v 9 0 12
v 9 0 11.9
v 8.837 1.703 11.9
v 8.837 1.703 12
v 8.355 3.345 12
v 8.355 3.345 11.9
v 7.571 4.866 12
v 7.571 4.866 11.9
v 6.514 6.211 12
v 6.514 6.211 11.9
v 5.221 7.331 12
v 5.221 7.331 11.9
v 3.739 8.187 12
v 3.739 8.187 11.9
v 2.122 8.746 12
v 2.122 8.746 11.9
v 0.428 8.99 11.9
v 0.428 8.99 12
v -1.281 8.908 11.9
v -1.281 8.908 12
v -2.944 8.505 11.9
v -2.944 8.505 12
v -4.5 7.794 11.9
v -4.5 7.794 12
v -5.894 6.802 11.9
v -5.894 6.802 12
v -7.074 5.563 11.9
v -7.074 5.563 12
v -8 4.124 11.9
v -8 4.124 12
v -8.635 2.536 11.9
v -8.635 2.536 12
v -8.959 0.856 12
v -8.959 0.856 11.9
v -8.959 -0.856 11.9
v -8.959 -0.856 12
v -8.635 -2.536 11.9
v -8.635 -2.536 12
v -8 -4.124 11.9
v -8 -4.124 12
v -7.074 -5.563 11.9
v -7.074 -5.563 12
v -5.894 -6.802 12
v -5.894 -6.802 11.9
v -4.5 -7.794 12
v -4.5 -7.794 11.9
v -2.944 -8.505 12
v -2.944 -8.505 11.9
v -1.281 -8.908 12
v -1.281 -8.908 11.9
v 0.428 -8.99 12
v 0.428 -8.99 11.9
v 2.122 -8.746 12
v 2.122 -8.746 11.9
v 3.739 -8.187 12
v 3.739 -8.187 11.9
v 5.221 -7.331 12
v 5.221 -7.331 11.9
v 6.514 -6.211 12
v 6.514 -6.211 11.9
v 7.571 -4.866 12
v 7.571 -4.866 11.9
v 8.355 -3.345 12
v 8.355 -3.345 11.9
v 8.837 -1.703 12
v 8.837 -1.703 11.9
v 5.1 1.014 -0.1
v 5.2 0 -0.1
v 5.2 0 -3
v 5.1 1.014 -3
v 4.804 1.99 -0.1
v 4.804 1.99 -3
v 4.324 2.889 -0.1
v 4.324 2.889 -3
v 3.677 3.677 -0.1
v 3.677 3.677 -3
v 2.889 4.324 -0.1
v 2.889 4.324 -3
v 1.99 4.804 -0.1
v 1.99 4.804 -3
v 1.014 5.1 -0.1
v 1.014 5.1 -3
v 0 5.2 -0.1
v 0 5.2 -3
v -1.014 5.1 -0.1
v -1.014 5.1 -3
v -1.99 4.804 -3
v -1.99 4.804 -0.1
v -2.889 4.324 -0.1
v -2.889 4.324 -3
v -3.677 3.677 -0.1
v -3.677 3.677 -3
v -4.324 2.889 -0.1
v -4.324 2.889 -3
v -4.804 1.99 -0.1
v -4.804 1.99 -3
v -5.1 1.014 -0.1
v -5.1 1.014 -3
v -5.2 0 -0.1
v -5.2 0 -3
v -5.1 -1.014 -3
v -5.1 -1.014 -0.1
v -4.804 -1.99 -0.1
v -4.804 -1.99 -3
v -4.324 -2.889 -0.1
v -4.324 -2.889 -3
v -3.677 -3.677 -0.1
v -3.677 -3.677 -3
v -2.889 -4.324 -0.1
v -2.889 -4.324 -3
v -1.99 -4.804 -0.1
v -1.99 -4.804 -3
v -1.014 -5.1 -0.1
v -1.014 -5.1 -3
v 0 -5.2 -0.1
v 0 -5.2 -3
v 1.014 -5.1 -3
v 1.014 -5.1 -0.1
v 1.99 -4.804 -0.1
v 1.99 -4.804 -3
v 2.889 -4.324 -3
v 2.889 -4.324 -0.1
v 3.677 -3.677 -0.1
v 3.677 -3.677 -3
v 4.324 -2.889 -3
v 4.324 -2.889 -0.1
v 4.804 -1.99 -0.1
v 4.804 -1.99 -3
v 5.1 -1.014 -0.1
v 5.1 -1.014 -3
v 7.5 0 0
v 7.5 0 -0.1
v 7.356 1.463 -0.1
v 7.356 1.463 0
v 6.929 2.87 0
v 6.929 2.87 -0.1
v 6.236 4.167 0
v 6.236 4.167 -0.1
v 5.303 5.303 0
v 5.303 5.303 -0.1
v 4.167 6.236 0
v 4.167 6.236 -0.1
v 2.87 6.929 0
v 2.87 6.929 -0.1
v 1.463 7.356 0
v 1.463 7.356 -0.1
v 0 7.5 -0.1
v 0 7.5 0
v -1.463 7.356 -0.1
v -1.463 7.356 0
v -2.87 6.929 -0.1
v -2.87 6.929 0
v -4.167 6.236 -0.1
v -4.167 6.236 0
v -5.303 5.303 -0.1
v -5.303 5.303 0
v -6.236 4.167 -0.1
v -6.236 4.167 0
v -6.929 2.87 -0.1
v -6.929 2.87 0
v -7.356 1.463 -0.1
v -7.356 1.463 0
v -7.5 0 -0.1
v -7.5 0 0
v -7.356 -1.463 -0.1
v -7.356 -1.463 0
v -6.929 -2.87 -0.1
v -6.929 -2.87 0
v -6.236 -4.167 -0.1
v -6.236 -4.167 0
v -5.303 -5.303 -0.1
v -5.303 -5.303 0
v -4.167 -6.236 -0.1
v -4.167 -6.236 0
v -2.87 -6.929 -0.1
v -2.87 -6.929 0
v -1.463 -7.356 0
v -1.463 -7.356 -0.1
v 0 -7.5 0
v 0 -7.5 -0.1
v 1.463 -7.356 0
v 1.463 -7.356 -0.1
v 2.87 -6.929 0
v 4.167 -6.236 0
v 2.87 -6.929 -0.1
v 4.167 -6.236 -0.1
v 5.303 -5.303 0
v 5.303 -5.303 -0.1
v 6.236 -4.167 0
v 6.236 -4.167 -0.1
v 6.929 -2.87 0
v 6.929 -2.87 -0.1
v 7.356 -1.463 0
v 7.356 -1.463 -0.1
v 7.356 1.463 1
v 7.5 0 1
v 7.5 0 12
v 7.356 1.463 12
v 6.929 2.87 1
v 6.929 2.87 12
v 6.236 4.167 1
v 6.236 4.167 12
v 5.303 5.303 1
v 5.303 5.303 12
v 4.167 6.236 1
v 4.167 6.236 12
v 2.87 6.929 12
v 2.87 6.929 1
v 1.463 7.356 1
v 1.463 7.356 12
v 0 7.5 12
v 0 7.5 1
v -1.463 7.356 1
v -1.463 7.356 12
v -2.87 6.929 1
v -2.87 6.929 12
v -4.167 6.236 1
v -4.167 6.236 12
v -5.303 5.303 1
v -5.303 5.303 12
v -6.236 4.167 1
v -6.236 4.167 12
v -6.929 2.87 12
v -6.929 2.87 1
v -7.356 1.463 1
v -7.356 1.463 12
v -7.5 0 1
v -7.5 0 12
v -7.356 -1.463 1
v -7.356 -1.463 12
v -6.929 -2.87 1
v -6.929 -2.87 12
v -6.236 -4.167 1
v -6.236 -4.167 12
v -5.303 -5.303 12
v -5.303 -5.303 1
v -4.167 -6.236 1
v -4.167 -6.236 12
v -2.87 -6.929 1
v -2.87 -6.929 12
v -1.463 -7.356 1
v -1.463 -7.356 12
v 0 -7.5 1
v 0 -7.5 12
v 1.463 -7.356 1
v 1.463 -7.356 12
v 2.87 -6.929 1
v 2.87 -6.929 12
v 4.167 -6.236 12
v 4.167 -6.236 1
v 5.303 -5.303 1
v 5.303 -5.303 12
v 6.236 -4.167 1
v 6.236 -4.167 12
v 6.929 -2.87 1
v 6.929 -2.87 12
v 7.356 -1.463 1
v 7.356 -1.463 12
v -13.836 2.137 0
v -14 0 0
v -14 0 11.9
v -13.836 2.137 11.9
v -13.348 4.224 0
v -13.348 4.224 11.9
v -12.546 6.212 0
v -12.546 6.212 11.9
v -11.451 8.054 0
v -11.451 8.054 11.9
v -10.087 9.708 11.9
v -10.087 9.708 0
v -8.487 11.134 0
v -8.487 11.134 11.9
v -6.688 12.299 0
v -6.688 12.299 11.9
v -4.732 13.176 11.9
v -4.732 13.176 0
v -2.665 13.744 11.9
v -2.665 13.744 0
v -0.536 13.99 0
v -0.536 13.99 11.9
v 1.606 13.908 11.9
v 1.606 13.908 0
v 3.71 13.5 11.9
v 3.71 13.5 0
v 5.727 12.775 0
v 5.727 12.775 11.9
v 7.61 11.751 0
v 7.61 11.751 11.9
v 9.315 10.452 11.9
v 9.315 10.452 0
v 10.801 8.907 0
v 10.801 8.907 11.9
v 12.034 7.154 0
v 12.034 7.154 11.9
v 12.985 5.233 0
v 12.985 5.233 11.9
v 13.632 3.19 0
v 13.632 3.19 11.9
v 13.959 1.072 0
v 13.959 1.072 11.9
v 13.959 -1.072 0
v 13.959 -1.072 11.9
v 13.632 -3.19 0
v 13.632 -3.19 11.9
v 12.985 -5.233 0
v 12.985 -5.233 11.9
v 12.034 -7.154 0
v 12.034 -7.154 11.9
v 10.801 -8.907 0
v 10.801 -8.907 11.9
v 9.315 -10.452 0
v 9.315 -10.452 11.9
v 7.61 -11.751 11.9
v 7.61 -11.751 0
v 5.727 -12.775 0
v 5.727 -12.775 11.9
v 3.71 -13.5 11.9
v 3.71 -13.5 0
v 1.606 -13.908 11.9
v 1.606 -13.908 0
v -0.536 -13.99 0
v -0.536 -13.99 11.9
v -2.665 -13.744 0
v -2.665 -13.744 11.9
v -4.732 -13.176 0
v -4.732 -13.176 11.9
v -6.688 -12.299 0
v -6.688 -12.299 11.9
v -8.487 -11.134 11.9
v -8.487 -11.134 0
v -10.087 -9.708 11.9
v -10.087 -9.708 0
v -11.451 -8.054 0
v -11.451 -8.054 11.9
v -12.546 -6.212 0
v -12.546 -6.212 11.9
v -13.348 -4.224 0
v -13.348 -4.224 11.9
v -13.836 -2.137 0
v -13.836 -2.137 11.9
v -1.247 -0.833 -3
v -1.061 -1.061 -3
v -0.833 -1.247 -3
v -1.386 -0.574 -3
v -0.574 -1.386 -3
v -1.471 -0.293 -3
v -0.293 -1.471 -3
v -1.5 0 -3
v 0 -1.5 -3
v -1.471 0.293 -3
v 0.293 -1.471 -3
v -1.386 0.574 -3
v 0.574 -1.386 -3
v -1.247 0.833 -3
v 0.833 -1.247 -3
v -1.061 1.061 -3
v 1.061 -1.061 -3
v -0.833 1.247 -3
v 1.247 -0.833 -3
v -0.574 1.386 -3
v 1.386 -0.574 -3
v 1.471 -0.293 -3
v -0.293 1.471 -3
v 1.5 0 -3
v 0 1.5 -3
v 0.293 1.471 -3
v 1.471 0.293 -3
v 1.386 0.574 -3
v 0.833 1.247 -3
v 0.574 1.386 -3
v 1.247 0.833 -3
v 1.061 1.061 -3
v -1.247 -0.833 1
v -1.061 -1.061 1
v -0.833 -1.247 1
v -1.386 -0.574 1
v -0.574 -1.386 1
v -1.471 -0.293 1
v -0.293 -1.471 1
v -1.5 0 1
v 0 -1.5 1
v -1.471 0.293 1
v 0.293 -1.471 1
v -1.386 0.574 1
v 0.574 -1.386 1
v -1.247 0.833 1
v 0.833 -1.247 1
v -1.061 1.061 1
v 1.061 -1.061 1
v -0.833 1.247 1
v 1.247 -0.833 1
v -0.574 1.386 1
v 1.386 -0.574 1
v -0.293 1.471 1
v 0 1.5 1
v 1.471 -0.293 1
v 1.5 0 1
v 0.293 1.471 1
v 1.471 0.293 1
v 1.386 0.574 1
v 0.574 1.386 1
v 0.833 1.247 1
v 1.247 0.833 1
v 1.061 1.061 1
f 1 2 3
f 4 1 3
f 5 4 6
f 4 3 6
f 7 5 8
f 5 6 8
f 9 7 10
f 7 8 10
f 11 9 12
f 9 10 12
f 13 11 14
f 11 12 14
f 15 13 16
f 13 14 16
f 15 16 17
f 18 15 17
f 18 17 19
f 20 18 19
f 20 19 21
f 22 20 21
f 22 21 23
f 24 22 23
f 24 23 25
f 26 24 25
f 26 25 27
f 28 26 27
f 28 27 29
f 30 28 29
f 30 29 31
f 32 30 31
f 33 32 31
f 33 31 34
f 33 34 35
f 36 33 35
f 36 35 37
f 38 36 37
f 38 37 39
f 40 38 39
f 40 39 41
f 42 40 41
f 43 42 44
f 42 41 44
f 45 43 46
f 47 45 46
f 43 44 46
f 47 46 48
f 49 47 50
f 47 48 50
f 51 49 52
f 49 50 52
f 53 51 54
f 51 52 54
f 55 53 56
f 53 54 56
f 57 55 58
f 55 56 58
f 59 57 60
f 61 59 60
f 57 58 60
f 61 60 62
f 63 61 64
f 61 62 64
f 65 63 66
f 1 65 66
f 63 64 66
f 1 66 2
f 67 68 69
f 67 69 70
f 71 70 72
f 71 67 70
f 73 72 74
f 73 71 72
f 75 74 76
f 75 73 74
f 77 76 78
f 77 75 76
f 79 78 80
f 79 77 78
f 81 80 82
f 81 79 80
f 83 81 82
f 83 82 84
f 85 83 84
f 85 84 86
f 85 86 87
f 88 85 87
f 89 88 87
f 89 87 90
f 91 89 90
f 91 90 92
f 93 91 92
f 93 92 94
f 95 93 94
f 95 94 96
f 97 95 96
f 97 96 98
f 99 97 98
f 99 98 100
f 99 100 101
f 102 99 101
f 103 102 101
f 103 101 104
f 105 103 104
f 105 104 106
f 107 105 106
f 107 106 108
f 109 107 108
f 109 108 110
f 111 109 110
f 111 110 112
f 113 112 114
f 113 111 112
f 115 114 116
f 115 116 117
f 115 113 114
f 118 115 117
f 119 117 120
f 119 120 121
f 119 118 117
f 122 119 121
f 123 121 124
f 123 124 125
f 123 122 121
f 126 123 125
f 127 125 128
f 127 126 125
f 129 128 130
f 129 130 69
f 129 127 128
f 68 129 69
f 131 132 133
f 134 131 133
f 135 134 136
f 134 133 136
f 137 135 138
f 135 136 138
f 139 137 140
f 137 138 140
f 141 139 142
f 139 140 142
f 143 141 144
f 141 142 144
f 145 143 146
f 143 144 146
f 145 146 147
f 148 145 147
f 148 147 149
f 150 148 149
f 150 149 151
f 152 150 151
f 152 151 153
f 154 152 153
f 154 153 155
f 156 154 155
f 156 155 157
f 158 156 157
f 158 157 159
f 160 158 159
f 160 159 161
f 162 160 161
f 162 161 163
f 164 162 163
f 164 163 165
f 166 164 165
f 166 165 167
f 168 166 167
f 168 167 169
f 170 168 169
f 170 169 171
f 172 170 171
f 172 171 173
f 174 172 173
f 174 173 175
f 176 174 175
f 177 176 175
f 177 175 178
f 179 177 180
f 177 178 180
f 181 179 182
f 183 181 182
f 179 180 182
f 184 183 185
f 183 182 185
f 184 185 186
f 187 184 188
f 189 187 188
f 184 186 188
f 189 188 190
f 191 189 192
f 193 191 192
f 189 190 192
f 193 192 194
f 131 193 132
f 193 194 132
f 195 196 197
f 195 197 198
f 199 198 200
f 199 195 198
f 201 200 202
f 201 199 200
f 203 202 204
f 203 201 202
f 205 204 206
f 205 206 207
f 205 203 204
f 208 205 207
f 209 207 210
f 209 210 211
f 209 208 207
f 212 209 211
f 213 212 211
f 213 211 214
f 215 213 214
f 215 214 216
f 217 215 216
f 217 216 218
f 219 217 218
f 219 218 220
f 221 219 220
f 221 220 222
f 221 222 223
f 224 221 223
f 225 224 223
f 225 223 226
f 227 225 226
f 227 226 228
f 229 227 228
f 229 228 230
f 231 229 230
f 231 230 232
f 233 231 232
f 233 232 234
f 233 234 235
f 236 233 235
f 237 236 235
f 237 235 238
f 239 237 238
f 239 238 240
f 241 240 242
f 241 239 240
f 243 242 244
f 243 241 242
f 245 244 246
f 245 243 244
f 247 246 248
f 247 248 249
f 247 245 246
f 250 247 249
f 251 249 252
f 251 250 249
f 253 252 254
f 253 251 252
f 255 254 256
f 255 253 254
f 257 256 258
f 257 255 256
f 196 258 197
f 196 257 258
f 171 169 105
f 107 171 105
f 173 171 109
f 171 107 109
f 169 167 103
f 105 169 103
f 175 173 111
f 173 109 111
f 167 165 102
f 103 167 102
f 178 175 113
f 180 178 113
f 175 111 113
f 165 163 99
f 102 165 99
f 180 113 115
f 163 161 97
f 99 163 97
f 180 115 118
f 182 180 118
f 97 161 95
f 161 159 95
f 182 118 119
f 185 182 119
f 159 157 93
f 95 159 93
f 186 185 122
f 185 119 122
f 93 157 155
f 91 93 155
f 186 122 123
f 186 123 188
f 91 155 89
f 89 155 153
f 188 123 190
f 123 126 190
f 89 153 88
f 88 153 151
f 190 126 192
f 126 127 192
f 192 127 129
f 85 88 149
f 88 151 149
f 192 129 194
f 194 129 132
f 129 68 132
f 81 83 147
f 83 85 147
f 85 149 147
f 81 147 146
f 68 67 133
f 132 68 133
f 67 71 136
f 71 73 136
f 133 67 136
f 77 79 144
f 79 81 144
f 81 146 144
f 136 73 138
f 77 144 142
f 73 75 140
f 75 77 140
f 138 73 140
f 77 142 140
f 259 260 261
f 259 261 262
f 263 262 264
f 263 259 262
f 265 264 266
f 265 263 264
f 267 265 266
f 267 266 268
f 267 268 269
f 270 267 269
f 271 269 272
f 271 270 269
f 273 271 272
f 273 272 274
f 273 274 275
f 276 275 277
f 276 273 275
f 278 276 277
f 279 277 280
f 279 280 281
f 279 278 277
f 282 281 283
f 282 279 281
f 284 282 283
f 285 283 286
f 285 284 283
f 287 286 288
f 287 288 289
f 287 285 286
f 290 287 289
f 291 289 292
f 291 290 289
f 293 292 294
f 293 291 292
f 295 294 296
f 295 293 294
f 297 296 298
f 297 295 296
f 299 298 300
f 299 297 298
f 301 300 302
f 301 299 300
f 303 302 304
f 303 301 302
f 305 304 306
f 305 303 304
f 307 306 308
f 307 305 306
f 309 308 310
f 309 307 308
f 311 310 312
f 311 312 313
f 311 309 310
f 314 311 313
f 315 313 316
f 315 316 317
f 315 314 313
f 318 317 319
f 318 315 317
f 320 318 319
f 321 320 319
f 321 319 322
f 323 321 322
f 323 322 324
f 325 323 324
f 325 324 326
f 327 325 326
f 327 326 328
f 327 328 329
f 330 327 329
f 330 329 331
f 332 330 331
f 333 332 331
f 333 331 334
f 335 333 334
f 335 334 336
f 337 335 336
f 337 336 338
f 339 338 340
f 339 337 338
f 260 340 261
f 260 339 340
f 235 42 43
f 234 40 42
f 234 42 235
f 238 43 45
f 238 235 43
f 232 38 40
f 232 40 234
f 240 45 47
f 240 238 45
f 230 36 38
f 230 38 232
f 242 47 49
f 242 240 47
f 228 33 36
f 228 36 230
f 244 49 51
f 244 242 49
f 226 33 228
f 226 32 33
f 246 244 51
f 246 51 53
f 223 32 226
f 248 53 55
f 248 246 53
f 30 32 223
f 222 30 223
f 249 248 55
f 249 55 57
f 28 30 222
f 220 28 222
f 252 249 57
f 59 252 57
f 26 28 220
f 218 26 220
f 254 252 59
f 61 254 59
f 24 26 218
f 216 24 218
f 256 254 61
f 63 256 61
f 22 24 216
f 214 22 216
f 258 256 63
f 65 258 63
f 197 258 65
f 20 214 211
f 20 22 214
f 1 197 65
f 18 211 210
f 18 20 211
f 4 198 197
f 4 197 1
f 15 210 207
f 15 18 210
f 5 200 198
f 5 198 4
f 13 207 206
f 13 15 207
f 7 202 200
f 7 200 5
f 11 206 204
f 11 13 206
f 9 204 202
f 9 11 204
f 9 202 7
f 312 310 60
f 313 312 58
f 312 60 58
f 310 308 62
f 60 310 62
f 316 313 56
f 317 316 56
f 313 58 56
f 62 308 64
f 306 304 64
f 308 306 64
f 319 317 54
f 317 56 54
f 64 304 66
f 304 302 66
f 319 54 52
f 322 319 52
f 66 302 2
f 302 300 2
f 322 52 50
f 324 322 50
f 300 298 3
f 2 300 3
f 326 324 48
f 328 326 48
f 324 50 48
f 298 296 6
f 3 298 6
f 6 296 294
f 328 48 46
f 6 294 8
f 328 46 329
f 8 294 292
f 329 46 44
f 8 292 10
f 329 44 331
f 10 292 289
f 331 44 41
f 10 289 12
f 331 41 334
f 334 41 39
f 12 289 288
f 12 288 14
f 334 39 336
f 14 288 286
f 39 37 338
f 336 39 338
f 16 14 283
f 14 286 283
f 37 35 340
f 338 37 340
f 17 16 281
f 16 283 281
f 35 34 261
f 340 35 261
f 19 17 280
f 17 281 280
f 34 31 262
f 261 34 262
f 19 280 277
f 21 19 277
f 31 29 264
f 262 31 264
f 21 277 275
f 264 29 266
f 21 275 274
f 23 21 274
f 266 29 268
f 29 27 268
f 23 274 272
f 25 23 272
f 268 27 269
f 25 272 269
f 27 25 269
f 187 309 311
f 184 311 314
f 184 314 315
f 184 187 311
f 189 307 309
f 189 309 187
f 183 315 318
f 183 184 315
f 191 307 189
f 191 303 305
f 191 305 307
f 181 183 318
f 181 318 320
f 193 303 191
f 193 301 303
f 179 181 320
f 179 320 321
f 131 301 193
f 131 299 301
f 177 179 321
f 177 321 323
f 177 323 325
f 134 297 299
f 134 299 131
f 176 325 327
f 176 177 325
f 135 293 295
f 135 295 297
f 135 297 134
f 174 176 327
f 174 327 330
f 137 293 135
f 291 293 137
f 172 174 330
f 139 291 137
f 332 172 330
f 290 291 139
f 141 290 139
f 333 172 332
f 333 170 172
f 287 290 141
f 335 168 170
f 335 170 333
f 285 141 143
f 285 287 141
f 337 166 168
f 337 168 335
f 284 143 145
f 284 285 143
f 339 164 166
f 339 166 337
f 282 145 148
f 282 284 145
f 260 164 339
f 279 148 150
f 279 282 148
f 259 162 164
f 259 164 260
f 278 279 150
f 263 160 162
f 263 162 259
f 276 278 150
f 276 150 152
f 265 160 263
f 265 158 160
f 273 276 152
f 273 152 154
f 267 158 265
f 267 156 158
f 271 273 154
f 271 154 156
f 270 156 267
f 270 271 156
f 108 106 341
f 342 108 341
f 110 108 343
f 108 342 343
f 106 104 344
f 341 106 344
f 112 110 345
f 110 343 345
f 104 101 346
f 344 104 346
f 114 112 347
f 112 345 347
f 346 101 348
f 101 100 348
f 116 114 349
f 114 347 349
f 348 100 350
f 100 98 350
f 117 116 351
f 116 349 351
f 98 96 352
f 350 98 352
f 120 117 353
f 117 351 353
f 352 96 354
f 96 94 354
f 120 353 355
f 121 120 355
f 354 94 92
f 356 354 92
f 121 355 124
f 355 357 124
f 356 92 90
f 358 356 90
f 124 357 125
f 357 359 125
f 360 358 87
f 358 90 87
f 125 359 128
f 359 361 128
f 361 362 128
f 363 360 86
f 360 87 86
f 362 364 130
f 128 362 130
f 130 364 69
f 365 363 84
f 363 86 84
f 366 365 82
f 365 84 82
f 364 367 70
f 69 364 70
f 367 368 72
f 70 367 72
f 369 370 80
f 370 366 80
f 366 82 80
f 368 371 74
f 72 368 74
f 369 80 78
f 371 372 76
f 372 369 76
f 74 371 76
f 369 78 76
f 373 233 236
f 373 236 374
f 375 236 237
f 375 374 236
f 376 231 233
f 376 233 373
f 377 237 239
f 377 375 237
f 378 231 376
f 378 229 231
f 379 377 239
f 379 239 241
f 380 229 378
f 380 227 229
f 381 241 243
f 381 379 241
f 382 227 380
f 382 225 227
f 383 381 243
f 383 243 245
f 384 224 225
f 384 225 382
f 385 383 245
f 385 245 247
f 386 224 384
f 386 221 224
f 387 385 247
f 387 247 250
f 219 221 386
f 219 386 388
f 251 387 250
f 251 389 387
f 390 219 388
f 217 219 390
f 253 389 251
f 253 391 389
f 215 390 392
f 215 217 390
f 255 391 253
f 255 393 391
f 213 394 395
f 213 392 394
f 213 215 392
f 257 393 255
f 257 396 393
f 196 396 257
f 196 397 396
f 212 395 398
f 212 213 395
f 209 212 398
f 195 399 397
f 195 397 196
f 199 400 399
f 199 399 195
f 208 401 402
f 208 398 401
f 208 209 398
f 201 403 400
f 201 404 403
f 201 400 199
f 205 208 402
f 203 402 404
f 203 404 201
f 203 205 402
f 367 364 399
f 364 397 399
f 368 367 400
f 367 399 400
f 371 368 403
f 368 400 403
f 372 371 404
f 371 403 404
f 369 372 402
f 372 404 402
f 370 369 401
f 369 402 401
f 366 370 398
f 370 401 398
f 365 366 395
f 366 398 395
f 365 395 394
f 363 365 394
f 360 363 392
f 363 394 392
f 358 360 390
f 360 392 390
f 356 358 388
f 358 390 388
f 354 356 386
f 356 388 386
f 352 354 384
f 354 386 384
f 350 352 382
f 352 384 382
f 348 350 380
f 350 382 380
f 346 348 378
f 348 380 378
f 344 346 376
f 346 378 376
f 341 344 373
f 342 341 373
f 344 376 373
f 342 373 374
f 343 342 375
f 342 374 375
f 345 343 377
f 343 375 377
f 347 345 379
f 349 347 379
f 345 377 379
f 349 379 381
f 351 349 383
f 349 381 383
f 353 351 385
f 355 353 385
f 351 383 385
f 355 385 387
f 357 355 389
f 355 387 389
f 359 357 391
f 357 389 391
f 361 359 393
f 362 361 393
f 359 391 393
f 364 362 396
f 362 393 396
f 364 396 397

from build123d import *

# Parameters (mm, degrees)
CROQUIS1_R                   = 9
CROQUIS1_R_2                 = 7.5
SALIENTE_EXTRUIR1_DEPTH      = 12
SALIENTE_EXTRUIR2_DEPTH      = 1
SALIENTE_EXTRUIR2_DEPTH_BACK = 0.1
CROQUIS2_R                   = 7.5
CROQUIS3_R                   = 5.2
CROQUIS3_R_2                 = 1.5
SALIENTE_EXTRUIR4_DEPTH      = 3
CROQUIS4_R                   = 14
CROQUIS4_R_2                 = 9
SALIENTE_EXTRUIR5_DEPTH      = 11.9
CORTAR_EXTRUIR1_START        = -15
CROQUIS6_R                   = 1.5
CORTAR_EXTRUIR1_DEPTH        = 15


with BuildPart() as part:
    # Croquis1 → Saliente-Extruir1 (new body)
    with BuildSketch(Plane.XY):
        Circle(CROQUIS1_R)
        Circle(CROQUIS1_R_2, mode=Mode.SUBTRACT)
    extrude(amount=SALIENTE_EXTRUIR1_DEPTH)

    # Croquis2 → Saliente-Extruir2 (add, two sides: drawn at the far end of the back side and taken through both)
    with BuildSketch(Plane.XY.offset(-SALIENTE_EXTRUIR2_DEPTH_BACK)):
        Circle(CROQUIS2_R)
    extrude(amount=SALIENTE_EXTRUIR2_DEPTH + SALIENTE_EXTRUIR2_DEPTH_BACK)

    # Croquis3 → Saliente-Extruir4 (add)
    with BuildSketch(Plane.XY):
        Circle(CROQUIS3_R)
        Circle(CROQUIS3_R_2, mode=Mode.SUBTRACT)
    extrude(amount=-SALIENTE_EXTRUIR4_DEPTH)

    # Croquis4 → Saliente-Extruir5 (add)
    with BuildSketch(Plane(origin=(0, 0, 0), x_dir=(-1, 0, 0), z_dir=(0, 0, -1))):
        Circle(CROQUIS4_R)
        Circle(CROQUIS4_R_2, mode=Mode.SUBTRACT)
    extrude(amount=-SALIENTE_EXTRUIR5_DEPTH)

    # Croquis6 → Cortar-Extruir1 (cut)
    with BuildSketch(Plane(origin=(0, 0, -3), x_dir=(-1, 0, 0), z_dir=(0, 0, -1)).offset(CORTAR_EXTRUIR1_START)):
        with Locations(Location((0, 0, 0), (0, 0, 180))):
            Circle(CROQUIS6_R)
    extrude(amount=CORTAR_EXTRUIR1_DEPTH, mode=Mode.SUBTRACT)


solid = part.part
